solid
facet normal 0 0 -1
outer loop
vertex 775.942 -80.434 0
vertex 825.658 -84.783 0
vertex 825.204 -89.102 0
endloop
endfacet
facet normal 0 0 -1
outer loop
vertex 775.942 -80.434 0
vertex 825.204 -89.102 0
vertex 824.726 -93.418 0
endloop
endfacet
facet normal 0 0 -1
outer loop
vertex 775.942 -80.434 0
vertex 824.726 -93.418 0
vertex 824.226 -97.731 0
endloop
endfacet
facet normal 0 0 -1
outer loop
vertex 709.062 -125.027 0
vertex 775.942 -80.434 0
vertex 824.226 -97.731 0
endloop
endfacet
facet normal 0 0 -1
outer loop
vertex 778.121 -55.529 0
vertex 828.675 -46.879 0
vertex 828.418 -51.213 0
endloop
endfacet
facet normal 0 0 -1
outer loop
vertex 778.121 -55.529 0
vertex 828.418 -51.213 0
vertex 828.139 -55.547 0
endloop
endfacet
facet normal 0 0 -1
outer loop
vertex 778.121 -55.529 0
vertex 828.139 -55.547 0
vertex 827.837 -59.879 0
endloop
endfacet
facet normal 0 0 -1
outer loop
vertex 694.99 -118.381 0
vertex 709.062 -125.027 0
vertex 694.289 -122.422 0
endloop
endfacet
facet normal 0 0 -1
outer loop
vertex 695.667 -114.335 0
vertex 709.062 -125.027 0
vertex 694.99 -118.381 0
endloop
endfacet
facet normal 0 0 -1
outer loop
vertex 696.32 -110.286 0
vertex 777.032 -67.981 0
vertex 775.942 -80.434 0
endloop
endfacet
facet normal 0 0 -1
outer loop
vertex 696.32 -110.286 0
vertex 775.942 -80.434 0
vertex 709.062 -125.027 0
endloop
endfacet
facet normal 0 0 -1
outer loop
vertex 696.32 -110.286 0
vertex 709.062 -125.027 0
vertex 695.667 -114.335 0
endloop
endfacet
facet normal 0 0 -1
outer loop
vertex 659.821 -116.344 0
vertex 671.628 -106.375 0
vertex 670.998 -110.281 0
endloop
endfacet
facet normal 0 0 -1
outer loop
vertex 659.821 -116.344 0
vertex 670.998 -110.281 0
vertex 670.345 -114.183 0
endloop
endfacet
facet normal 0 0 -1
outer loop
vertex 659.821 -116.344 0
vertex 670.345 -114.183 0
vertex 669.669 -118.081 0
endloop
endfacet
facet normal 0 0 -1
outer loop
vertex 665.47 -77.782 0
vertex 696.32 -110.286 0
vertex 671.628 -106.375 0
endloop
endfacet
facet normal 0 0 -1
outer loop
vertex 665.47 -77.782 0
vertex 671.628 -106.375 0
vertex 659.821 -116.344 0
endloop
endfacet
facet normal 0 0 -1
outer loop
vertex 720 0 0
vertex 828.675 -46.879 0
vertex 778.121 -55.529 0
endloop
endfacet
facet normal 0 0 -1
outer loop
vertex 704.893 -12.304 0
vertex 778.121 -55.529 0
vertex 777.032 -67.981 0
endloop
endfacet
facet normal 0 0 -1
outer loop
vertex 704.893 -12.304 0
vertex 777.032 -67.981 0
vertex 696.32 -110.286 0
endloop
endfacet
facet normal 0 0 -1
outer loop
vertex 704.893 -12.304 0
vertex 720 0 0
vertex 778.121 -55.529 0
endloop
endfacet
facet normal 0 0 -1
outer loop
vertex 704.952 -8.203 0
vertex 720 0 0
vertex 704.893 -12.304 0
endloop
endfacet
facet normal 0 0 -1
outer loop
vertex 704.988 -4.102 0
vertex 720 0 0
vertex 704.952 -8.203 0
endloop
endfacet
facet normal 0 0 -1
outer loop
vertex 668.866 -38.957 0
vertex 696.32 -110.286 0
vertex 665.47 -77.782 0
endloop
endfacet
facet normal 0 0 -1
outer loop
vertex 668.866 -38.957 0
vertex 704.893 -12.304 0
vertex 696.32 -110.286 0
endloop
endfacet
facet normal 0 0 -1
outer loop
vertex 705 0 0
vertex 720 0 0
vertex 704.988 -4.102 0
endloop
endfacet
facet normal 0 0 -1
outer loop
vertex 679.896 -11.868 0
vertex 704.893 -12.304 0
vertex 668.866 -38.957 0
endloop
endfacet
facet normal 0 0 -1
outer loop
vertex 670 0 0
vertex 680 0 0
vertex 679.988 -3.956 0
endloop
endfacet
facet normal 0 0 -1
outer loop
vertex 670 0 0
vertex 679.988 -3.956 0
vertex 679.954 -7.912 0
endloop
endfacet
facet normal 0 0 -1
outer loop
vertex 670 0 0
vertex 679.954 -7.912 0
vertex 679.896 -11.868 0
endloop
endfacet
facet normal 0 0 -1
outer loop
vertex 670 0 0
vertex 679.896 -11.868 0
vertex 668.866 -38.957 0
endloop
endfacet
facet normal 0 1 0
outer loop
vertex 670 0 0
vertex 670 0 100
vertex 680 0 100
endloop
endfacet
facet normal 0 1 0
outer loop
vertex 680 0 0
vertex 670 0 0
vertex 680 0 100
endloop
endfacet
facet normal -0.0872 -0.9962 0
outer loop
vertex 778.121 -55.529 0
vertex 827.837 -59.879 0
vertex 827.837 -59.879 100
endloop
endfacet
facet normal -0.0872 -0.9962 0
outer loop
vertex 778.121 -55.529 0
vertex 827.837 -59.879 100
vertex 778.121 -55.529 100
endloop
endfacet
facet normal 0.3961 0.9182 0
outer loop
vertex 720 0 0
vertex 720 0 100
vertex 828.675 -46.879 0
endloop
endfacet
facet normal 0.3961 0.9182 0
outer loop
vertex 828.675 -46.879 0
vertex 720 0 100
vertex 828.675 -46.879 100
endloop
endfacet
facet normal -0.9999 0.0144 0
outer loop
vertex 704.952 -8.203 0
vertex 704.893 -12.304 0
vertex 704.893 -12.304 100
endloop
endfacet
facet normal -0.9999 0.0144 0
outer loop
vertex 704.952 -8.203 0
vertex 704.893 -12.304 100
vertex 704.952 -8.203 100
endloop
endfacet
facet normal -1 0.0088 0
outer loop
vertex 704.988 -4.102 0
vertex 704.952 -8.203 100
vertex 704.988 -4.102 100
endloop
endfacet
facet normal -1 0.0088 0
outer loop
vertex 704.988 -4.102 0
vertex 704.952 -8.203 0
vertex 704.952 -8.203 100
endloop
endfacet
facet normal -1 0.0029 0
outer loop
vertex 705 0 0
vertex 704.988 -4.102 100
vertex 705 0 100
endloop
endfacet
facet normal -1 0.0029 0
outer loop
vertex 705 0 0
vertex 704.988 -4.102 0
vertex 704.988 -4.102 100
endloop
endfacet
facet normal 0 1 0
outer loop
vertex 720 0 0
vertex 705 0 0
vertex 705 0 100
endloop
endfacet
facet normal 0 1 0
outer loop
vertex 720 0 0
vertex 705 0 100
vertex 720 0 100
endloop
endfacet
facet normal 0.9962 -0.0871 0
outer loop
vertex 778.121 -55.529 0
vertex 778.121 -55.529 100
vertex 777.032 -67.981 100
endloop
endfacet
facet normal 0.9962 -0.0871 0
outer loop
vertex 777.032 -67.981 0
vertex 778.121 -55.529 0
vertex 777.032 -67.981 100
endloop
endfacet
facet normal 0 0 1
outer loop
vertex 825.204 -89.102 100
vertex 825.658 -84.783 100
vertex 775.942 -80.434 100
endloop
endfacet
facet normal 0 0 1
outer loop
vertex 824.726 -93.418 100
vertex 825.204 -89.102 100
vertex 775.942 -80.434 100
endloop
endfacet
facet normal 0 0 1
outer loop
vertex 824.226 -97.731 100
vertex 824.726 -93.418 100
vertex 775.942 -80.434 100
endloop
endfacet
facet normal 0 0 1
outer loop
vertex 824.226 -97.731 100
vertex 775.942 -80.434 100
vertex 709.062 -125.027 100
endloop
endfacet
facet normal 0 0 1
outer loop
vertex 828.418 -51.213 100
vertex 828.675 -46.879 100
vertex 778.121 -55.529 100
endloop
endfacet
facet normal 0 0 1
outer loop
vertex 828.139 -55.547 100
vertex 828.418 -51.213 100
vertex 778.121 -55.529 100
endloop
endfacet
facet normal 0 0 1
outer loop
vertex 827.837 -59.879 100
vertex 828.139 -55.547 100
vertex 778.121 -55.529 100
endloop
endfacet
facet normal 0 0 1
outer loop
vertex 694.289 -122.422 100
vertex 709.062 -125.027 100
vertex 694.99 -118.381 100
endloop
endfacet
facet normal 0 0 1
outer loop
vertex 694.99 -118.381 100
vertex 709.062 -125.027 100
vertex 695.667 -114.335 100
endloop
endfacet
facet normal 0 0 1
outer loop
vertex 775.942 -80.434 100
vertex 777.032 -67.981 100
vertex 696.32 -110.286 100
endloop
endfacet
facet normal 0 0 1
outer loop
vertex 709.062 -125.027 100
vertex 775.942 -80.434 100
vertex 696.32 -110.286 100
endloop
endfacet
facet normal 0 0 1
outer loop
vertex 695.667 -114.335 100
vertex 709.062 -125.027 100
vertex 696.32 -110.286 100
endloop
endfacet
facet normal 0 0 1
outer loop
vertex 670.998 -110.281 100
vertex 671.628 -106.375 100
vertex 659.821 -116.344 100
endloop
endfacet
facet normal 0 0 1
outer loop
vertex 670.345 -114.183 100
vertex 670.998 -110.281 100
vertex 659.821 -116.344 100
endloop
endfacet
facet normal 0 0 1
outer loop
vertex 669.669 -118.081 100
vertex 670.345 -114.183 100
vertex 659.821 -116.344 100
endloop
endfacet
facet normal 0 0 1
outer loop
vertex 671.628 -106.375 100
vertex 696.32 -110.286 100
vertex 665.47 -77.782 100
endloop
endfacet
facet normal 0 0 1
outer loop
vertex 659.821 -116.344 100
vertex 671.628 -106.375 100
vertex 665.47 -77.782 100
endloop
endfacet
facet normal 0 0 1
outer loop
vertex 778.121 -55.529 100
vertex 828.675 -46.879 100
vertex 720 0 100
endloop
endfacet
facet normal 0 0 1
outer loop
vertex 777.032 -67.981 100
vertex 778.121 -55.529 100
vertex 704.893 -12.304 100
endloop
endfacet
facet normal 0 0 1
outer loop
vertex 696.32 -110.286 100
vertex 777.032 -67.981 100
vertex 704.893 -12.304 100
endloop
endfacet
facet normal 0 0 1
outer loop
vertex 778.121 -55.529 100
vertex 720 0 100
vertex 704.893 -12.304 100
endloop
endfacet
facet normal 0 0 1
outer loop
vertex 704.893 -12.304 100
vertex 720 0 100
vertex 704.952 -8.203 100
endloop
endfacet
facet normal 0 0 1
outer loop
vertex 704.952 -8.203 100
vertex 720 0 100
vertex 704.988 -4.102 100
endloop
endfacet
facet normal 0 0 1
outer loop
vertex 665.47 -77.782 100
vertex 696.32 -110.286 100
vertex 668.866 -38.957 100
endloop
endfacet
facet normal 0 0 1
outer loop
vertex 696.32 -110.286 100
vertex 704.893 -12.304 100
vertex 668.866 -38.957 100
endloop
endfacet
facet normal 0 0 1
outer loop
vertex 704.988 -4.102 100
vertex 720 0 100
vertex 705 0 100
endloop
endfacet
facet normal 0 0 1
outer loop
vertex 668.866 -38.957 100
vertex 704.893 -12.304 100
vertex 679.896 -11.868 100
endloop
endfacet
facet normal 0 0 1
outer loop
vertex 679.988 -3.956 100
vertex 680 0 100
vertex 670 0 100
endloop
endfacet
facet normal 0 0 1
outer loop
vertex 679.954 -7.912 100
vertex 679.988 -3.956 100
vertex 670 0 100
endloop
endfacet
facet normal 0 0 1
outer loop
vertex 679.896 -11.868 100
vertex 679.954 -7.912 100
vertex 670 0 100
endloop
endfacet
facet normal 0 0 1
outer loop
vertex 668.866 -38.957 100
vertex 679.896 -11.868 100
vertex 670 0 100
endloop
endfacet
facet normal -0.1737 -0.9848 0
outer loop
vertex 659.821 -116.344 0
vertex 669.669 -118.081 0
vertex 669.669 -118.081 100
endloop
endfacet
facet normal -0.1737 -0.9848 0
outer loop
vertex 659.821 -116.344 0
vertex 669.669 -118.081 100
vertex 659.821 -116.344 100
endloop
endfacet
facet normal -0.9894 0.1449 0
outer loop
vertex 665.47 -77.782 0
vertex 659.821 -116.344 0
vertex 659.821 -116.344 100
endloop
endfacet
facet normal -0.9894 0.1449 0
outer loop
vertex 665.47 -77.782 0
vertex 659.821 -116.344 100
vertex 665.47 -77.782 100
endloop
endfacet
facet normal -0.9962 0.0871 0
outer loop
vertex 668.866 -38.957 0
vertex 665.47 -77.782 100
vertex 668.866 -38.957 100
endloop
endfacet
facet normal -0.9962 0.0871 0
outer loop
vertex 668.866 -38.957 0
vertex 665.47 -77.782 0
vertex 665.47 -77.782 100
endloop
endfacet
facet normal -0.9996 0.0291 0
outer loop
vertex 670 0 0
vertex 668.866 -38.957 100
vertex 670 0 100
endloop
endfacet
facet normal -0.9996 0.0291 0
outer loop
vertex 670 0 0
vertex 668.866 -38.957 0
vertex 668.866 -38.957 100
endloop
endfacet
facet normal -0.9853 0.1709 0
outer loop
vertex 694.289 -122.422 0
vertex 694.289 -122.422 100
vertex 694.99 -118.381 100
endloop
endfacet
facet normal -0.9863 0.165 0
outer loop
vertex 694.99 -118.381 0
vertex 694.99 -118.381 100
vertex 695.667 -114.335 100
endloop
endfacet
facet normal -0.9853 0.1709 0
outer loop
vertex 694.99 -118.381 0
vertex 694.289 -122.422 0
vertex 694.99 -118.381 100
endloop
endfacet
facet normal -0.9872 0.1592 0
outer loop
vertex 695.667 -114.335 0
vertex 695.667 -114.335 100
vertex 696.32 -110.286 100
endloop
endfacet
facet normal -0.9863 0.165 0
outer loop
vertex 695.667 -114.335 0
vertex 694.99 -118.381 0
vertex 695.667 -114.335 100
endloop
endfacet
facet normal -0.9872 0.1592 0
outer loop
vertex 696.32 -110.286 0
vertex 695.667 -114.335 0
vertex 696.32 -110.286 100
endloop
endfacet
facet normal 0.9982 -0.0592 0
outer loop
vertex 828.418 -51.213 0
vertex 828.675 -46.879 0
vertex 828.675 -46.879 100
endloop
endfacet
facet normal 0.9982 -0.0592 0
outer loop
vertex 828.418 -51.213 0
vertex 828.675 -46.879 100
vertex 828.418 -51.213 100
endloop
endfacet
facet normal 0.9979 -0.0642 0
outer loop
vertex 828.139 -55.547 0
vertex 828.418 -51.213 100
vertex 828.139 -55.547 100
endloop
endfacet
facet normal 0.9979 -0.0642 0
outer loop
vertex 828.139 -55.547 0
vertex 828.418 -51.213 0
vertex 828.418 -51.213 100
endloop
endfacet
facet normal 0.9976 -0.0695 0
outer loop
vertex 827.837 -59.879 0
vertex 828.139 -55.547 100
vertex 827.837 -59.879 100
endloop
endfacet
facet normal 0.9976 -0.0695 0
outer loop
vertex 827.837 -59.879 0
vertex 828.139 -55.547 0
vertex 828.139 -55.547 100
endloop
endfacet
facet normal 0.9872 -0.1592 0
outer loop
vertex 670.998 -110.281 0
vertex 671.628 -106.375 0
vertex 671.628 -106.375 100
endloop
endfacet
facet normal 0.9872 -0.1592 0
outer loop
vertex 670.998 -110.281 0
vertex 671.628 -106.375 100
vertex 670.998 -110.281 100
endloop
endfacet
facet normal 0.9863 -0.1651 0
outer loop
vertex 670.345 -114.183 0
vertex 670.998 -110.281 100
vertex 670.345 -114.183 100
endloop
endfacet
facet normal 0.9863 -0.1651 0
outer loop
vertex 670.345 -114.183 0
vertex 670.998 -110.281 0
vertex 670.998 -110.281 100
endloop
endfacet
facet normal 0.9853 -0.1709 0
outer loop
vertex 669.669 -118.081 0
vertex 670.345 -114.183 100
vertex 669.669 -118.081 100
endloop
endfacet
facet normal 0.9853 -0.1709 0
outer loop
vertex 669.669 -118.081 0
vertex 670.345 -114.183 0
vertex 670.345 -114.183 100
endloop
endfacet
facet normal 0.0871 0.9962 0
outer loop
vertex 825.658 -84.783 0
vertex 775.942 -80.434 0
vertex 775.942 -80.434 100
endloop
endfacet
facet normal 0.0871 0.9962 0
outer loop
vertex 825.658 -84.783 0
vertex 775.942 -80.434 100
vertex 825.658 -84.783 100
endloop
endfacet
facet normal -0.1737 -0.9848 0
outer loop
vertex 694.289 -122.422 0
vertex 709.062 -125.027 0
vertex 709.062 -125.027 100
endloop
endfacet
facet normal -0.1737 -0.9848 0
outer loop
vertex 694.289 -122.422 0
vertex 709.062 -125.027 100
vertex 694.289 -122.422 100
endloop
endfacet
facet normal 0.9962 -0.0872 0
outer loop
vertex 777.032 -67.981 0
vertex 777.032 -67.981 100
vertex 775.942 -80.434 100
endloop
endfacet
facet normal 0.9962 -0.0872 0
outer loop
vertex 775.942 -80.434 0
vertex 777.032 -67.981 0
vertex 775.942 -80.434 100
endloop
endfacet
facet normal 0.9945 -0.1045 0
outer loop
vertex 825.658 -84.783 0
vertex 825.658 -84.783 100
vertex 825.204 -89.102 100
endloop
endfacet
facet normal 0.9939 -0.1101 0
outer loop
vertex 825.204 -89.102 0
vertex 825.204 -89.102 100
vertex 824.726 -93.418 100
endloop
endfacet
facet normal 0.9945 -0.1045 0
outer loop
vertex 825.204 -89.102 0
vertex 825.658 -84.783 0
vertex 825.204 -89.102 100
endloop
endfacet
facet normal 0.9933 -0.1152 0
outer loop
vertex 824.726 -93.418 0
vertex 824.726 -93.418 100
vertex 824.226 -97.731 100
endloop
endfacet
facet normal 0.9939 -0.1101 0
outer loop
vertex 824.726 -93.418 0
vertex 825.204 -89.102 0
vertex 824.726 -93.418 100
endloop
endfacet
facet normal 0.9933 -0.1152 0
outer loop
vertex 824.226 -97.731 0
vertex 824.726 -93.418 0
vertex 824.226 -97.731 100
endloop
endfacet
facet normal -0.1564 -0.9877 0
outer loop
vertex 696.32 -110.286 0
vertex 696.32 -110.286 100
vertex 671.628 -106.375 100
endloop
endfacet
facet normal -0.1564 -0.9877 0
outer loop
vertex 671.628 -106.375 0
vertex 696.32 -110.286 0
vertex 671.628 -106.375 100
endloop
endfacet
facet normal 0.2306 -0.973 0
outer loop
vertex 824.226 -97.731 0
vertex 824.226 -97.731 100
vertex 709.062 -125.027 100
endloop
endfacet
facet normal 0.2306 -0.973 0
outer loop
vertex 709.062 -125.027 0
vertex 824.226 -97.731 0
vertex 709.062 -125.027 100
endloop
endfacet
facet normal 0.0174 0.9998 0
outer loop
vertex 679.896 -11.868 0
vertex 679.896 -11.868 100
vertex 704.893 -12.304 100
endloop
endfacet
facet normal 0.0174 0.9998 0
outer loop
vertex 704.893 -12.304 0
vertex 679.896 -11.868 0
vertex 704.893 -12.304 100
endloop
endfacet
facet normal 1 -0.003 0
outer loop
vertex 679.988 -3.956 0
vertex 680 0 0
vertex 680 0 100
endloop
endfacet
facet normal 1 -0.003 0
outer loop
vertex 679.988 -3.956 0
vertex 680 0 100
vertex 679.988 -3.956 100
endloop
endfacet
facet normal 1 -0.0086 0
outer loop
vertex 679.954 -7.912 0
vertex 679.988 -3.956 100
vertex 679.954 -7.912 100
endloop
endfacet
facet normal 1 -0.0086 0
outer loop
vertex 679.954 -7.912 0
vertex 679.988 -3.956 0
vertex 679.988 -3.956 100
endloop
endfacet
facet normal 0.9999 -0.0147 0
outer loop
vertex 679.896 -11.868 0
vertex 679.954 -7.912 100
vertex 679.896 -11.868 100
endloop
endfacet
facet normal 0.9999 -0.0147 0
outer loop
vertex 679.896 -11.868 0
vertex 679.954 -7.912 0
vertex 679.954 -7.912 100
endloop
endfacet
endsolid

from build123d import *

# Parameters (mm, degrees)
EXTRUDE_1_DEPTH     = 100
CUT_EXTRUDE_1_DEPTH = 849.335356313
CUT_EXTRUDE_2_DEPTH = 849.335356313
CUT_EXTRUDE_3_REACH = 850.335


with BuildPart() as part:
    # 草图1 → 凸台-拉伸1 (new body)
    with BuildSketch(Plane.XY):
        with BuildLine():
            Line((670, 0), (830, 0))
            ThreePointArc((830, 0), (826.841599416, -72.339266481), (817.390435, -144.127987464))
            Line((817.390435, -144.127987464), (659.821194518, -116.344279037))
            ThreePointArc((659.821194518, -116.344279037), (667.450447721, -58.394347641), (670, 0))
        make_face()
    extrude(amount=EXTRUDE_1_DEPTH)

    # 草图3 → 切除-拉伸1 (cut, through all)
    with BuildSketch(Plane.XY.offset(100)):
        with BuildLine():
            Line((778.121311296, -55.529045617), (777.031864512, -67.981479343))
            Line((777.031864512, -67.981479343), (775.942417727, -80.433913069))
            Line((775.942417727, -80.433913069), (825.658378988, -84.783496076))
            ThreePointArc((825.658378988, -84.783496076), (826.841599416, -72.339266481), (827.837272557, -59.878628624))
            Line((827.837272557, -59.878628624), (778.121311296, -55.529045617))
        make_face()
    extrude(amount=-CUT_EXTRUDE_1_DEPTH, mode=Mode.SUBTRACT)

    # 草图6 → 切除-拉伸2 (cut, through all)
    with BuildSketch(Plane(origin=(0, 0, 0), x_dir=(-1, 0, 0), z_dir=(0, 0, -1))):
        with BuildLine():
            Line((-669.669272048, -118.080760814), (-694.289465874, -122.421965255))
            ThreePointArc((-694.289465874, -122.421965255), (-695.331349084, -116.358562132), (-696.32028012, -110.286297853))
            Line((-696.32028012, -110.286297853), (-671.628071605, -106.375436227))
            ThreePointArc((-671.628071605, -106.375436227), (-670.674209045, -112.232371985), (-669.669272048, -118.080760814))
        make_face()
        with BuildLine():
            Line((-679.896432706, -11.867636377), (-704.892625085, -12.303946538))
            ThreePointArc((-704.892625085, -12.303946538), (-704.97315576, -6.152207526), (-705, 0))
            Line((-705, 0), (-680, 0))
            ThreePointArc((-680, 0), (-679.974107684, -5.934044139), (-679.896432706, -11.867636377))
        make_face()
    extrude(amount=-CUT_EXTRUDE_2_DEPTH, mode=Mode.SUBTRACT)

    # 草图7 → 切除-拉伸3 (cut, up to next)
    with BuildSketch(Plane.XY.offset(100), mode=Mode.PRIVATE) as cut_extrude_3_sk1:
        with BuildLine():
            Line((720, 0), (828.675083599, -46.878628624))
            ThreePointArc((828.675083599, -46.878628624), (829.668704781, -23.44867387), (830, 0))
            Line((830, 0), (720, 0))
        make_face()
    cut_extrude_3_tool1 = extrude(cut_extrude_3_sk1.sketch, amount=-CUT_EXTRUDE_3_REACH, mode=Mode.PRIVATE) & part.part
    # 草图7 → 切除-拉伸3 (cut, up to next)
    with BuildSketch(Plane.XY.offset(100), mode=Mode.PRIVATE) as cut_extrude_3_sk2:
        with BuildLine():
            Line((824.226035489, -97.731481226), (709.061582169, -125.02668792))
            Line((709.061582169, -125.02668792), (817.390435, -144.127987464))
            ThreePointArc((817.390435, -144.127987464), (821.135992387, -120.978022827), (824.226035489, -97.731481226))
        make_face()
    cut_extrude_3_tool2 = extrude(cut_extrude_3_sk2.sketch, amount=-CUT_EXTRUDE_3_REACH, mode=Mode.PRIVATE) & part.part
    add(cut_extrude_3_tool1.solids().sort_by_distance((793.038059, -15.657488, 100))[0], mode=Mode.SUBTRACT)
    add(cut_extrude_3_tool2.solids().sort_by_distance((783.708923, -122.289998, 100))[0], mode=Mode.SUBTRACT)


solid = part.part
